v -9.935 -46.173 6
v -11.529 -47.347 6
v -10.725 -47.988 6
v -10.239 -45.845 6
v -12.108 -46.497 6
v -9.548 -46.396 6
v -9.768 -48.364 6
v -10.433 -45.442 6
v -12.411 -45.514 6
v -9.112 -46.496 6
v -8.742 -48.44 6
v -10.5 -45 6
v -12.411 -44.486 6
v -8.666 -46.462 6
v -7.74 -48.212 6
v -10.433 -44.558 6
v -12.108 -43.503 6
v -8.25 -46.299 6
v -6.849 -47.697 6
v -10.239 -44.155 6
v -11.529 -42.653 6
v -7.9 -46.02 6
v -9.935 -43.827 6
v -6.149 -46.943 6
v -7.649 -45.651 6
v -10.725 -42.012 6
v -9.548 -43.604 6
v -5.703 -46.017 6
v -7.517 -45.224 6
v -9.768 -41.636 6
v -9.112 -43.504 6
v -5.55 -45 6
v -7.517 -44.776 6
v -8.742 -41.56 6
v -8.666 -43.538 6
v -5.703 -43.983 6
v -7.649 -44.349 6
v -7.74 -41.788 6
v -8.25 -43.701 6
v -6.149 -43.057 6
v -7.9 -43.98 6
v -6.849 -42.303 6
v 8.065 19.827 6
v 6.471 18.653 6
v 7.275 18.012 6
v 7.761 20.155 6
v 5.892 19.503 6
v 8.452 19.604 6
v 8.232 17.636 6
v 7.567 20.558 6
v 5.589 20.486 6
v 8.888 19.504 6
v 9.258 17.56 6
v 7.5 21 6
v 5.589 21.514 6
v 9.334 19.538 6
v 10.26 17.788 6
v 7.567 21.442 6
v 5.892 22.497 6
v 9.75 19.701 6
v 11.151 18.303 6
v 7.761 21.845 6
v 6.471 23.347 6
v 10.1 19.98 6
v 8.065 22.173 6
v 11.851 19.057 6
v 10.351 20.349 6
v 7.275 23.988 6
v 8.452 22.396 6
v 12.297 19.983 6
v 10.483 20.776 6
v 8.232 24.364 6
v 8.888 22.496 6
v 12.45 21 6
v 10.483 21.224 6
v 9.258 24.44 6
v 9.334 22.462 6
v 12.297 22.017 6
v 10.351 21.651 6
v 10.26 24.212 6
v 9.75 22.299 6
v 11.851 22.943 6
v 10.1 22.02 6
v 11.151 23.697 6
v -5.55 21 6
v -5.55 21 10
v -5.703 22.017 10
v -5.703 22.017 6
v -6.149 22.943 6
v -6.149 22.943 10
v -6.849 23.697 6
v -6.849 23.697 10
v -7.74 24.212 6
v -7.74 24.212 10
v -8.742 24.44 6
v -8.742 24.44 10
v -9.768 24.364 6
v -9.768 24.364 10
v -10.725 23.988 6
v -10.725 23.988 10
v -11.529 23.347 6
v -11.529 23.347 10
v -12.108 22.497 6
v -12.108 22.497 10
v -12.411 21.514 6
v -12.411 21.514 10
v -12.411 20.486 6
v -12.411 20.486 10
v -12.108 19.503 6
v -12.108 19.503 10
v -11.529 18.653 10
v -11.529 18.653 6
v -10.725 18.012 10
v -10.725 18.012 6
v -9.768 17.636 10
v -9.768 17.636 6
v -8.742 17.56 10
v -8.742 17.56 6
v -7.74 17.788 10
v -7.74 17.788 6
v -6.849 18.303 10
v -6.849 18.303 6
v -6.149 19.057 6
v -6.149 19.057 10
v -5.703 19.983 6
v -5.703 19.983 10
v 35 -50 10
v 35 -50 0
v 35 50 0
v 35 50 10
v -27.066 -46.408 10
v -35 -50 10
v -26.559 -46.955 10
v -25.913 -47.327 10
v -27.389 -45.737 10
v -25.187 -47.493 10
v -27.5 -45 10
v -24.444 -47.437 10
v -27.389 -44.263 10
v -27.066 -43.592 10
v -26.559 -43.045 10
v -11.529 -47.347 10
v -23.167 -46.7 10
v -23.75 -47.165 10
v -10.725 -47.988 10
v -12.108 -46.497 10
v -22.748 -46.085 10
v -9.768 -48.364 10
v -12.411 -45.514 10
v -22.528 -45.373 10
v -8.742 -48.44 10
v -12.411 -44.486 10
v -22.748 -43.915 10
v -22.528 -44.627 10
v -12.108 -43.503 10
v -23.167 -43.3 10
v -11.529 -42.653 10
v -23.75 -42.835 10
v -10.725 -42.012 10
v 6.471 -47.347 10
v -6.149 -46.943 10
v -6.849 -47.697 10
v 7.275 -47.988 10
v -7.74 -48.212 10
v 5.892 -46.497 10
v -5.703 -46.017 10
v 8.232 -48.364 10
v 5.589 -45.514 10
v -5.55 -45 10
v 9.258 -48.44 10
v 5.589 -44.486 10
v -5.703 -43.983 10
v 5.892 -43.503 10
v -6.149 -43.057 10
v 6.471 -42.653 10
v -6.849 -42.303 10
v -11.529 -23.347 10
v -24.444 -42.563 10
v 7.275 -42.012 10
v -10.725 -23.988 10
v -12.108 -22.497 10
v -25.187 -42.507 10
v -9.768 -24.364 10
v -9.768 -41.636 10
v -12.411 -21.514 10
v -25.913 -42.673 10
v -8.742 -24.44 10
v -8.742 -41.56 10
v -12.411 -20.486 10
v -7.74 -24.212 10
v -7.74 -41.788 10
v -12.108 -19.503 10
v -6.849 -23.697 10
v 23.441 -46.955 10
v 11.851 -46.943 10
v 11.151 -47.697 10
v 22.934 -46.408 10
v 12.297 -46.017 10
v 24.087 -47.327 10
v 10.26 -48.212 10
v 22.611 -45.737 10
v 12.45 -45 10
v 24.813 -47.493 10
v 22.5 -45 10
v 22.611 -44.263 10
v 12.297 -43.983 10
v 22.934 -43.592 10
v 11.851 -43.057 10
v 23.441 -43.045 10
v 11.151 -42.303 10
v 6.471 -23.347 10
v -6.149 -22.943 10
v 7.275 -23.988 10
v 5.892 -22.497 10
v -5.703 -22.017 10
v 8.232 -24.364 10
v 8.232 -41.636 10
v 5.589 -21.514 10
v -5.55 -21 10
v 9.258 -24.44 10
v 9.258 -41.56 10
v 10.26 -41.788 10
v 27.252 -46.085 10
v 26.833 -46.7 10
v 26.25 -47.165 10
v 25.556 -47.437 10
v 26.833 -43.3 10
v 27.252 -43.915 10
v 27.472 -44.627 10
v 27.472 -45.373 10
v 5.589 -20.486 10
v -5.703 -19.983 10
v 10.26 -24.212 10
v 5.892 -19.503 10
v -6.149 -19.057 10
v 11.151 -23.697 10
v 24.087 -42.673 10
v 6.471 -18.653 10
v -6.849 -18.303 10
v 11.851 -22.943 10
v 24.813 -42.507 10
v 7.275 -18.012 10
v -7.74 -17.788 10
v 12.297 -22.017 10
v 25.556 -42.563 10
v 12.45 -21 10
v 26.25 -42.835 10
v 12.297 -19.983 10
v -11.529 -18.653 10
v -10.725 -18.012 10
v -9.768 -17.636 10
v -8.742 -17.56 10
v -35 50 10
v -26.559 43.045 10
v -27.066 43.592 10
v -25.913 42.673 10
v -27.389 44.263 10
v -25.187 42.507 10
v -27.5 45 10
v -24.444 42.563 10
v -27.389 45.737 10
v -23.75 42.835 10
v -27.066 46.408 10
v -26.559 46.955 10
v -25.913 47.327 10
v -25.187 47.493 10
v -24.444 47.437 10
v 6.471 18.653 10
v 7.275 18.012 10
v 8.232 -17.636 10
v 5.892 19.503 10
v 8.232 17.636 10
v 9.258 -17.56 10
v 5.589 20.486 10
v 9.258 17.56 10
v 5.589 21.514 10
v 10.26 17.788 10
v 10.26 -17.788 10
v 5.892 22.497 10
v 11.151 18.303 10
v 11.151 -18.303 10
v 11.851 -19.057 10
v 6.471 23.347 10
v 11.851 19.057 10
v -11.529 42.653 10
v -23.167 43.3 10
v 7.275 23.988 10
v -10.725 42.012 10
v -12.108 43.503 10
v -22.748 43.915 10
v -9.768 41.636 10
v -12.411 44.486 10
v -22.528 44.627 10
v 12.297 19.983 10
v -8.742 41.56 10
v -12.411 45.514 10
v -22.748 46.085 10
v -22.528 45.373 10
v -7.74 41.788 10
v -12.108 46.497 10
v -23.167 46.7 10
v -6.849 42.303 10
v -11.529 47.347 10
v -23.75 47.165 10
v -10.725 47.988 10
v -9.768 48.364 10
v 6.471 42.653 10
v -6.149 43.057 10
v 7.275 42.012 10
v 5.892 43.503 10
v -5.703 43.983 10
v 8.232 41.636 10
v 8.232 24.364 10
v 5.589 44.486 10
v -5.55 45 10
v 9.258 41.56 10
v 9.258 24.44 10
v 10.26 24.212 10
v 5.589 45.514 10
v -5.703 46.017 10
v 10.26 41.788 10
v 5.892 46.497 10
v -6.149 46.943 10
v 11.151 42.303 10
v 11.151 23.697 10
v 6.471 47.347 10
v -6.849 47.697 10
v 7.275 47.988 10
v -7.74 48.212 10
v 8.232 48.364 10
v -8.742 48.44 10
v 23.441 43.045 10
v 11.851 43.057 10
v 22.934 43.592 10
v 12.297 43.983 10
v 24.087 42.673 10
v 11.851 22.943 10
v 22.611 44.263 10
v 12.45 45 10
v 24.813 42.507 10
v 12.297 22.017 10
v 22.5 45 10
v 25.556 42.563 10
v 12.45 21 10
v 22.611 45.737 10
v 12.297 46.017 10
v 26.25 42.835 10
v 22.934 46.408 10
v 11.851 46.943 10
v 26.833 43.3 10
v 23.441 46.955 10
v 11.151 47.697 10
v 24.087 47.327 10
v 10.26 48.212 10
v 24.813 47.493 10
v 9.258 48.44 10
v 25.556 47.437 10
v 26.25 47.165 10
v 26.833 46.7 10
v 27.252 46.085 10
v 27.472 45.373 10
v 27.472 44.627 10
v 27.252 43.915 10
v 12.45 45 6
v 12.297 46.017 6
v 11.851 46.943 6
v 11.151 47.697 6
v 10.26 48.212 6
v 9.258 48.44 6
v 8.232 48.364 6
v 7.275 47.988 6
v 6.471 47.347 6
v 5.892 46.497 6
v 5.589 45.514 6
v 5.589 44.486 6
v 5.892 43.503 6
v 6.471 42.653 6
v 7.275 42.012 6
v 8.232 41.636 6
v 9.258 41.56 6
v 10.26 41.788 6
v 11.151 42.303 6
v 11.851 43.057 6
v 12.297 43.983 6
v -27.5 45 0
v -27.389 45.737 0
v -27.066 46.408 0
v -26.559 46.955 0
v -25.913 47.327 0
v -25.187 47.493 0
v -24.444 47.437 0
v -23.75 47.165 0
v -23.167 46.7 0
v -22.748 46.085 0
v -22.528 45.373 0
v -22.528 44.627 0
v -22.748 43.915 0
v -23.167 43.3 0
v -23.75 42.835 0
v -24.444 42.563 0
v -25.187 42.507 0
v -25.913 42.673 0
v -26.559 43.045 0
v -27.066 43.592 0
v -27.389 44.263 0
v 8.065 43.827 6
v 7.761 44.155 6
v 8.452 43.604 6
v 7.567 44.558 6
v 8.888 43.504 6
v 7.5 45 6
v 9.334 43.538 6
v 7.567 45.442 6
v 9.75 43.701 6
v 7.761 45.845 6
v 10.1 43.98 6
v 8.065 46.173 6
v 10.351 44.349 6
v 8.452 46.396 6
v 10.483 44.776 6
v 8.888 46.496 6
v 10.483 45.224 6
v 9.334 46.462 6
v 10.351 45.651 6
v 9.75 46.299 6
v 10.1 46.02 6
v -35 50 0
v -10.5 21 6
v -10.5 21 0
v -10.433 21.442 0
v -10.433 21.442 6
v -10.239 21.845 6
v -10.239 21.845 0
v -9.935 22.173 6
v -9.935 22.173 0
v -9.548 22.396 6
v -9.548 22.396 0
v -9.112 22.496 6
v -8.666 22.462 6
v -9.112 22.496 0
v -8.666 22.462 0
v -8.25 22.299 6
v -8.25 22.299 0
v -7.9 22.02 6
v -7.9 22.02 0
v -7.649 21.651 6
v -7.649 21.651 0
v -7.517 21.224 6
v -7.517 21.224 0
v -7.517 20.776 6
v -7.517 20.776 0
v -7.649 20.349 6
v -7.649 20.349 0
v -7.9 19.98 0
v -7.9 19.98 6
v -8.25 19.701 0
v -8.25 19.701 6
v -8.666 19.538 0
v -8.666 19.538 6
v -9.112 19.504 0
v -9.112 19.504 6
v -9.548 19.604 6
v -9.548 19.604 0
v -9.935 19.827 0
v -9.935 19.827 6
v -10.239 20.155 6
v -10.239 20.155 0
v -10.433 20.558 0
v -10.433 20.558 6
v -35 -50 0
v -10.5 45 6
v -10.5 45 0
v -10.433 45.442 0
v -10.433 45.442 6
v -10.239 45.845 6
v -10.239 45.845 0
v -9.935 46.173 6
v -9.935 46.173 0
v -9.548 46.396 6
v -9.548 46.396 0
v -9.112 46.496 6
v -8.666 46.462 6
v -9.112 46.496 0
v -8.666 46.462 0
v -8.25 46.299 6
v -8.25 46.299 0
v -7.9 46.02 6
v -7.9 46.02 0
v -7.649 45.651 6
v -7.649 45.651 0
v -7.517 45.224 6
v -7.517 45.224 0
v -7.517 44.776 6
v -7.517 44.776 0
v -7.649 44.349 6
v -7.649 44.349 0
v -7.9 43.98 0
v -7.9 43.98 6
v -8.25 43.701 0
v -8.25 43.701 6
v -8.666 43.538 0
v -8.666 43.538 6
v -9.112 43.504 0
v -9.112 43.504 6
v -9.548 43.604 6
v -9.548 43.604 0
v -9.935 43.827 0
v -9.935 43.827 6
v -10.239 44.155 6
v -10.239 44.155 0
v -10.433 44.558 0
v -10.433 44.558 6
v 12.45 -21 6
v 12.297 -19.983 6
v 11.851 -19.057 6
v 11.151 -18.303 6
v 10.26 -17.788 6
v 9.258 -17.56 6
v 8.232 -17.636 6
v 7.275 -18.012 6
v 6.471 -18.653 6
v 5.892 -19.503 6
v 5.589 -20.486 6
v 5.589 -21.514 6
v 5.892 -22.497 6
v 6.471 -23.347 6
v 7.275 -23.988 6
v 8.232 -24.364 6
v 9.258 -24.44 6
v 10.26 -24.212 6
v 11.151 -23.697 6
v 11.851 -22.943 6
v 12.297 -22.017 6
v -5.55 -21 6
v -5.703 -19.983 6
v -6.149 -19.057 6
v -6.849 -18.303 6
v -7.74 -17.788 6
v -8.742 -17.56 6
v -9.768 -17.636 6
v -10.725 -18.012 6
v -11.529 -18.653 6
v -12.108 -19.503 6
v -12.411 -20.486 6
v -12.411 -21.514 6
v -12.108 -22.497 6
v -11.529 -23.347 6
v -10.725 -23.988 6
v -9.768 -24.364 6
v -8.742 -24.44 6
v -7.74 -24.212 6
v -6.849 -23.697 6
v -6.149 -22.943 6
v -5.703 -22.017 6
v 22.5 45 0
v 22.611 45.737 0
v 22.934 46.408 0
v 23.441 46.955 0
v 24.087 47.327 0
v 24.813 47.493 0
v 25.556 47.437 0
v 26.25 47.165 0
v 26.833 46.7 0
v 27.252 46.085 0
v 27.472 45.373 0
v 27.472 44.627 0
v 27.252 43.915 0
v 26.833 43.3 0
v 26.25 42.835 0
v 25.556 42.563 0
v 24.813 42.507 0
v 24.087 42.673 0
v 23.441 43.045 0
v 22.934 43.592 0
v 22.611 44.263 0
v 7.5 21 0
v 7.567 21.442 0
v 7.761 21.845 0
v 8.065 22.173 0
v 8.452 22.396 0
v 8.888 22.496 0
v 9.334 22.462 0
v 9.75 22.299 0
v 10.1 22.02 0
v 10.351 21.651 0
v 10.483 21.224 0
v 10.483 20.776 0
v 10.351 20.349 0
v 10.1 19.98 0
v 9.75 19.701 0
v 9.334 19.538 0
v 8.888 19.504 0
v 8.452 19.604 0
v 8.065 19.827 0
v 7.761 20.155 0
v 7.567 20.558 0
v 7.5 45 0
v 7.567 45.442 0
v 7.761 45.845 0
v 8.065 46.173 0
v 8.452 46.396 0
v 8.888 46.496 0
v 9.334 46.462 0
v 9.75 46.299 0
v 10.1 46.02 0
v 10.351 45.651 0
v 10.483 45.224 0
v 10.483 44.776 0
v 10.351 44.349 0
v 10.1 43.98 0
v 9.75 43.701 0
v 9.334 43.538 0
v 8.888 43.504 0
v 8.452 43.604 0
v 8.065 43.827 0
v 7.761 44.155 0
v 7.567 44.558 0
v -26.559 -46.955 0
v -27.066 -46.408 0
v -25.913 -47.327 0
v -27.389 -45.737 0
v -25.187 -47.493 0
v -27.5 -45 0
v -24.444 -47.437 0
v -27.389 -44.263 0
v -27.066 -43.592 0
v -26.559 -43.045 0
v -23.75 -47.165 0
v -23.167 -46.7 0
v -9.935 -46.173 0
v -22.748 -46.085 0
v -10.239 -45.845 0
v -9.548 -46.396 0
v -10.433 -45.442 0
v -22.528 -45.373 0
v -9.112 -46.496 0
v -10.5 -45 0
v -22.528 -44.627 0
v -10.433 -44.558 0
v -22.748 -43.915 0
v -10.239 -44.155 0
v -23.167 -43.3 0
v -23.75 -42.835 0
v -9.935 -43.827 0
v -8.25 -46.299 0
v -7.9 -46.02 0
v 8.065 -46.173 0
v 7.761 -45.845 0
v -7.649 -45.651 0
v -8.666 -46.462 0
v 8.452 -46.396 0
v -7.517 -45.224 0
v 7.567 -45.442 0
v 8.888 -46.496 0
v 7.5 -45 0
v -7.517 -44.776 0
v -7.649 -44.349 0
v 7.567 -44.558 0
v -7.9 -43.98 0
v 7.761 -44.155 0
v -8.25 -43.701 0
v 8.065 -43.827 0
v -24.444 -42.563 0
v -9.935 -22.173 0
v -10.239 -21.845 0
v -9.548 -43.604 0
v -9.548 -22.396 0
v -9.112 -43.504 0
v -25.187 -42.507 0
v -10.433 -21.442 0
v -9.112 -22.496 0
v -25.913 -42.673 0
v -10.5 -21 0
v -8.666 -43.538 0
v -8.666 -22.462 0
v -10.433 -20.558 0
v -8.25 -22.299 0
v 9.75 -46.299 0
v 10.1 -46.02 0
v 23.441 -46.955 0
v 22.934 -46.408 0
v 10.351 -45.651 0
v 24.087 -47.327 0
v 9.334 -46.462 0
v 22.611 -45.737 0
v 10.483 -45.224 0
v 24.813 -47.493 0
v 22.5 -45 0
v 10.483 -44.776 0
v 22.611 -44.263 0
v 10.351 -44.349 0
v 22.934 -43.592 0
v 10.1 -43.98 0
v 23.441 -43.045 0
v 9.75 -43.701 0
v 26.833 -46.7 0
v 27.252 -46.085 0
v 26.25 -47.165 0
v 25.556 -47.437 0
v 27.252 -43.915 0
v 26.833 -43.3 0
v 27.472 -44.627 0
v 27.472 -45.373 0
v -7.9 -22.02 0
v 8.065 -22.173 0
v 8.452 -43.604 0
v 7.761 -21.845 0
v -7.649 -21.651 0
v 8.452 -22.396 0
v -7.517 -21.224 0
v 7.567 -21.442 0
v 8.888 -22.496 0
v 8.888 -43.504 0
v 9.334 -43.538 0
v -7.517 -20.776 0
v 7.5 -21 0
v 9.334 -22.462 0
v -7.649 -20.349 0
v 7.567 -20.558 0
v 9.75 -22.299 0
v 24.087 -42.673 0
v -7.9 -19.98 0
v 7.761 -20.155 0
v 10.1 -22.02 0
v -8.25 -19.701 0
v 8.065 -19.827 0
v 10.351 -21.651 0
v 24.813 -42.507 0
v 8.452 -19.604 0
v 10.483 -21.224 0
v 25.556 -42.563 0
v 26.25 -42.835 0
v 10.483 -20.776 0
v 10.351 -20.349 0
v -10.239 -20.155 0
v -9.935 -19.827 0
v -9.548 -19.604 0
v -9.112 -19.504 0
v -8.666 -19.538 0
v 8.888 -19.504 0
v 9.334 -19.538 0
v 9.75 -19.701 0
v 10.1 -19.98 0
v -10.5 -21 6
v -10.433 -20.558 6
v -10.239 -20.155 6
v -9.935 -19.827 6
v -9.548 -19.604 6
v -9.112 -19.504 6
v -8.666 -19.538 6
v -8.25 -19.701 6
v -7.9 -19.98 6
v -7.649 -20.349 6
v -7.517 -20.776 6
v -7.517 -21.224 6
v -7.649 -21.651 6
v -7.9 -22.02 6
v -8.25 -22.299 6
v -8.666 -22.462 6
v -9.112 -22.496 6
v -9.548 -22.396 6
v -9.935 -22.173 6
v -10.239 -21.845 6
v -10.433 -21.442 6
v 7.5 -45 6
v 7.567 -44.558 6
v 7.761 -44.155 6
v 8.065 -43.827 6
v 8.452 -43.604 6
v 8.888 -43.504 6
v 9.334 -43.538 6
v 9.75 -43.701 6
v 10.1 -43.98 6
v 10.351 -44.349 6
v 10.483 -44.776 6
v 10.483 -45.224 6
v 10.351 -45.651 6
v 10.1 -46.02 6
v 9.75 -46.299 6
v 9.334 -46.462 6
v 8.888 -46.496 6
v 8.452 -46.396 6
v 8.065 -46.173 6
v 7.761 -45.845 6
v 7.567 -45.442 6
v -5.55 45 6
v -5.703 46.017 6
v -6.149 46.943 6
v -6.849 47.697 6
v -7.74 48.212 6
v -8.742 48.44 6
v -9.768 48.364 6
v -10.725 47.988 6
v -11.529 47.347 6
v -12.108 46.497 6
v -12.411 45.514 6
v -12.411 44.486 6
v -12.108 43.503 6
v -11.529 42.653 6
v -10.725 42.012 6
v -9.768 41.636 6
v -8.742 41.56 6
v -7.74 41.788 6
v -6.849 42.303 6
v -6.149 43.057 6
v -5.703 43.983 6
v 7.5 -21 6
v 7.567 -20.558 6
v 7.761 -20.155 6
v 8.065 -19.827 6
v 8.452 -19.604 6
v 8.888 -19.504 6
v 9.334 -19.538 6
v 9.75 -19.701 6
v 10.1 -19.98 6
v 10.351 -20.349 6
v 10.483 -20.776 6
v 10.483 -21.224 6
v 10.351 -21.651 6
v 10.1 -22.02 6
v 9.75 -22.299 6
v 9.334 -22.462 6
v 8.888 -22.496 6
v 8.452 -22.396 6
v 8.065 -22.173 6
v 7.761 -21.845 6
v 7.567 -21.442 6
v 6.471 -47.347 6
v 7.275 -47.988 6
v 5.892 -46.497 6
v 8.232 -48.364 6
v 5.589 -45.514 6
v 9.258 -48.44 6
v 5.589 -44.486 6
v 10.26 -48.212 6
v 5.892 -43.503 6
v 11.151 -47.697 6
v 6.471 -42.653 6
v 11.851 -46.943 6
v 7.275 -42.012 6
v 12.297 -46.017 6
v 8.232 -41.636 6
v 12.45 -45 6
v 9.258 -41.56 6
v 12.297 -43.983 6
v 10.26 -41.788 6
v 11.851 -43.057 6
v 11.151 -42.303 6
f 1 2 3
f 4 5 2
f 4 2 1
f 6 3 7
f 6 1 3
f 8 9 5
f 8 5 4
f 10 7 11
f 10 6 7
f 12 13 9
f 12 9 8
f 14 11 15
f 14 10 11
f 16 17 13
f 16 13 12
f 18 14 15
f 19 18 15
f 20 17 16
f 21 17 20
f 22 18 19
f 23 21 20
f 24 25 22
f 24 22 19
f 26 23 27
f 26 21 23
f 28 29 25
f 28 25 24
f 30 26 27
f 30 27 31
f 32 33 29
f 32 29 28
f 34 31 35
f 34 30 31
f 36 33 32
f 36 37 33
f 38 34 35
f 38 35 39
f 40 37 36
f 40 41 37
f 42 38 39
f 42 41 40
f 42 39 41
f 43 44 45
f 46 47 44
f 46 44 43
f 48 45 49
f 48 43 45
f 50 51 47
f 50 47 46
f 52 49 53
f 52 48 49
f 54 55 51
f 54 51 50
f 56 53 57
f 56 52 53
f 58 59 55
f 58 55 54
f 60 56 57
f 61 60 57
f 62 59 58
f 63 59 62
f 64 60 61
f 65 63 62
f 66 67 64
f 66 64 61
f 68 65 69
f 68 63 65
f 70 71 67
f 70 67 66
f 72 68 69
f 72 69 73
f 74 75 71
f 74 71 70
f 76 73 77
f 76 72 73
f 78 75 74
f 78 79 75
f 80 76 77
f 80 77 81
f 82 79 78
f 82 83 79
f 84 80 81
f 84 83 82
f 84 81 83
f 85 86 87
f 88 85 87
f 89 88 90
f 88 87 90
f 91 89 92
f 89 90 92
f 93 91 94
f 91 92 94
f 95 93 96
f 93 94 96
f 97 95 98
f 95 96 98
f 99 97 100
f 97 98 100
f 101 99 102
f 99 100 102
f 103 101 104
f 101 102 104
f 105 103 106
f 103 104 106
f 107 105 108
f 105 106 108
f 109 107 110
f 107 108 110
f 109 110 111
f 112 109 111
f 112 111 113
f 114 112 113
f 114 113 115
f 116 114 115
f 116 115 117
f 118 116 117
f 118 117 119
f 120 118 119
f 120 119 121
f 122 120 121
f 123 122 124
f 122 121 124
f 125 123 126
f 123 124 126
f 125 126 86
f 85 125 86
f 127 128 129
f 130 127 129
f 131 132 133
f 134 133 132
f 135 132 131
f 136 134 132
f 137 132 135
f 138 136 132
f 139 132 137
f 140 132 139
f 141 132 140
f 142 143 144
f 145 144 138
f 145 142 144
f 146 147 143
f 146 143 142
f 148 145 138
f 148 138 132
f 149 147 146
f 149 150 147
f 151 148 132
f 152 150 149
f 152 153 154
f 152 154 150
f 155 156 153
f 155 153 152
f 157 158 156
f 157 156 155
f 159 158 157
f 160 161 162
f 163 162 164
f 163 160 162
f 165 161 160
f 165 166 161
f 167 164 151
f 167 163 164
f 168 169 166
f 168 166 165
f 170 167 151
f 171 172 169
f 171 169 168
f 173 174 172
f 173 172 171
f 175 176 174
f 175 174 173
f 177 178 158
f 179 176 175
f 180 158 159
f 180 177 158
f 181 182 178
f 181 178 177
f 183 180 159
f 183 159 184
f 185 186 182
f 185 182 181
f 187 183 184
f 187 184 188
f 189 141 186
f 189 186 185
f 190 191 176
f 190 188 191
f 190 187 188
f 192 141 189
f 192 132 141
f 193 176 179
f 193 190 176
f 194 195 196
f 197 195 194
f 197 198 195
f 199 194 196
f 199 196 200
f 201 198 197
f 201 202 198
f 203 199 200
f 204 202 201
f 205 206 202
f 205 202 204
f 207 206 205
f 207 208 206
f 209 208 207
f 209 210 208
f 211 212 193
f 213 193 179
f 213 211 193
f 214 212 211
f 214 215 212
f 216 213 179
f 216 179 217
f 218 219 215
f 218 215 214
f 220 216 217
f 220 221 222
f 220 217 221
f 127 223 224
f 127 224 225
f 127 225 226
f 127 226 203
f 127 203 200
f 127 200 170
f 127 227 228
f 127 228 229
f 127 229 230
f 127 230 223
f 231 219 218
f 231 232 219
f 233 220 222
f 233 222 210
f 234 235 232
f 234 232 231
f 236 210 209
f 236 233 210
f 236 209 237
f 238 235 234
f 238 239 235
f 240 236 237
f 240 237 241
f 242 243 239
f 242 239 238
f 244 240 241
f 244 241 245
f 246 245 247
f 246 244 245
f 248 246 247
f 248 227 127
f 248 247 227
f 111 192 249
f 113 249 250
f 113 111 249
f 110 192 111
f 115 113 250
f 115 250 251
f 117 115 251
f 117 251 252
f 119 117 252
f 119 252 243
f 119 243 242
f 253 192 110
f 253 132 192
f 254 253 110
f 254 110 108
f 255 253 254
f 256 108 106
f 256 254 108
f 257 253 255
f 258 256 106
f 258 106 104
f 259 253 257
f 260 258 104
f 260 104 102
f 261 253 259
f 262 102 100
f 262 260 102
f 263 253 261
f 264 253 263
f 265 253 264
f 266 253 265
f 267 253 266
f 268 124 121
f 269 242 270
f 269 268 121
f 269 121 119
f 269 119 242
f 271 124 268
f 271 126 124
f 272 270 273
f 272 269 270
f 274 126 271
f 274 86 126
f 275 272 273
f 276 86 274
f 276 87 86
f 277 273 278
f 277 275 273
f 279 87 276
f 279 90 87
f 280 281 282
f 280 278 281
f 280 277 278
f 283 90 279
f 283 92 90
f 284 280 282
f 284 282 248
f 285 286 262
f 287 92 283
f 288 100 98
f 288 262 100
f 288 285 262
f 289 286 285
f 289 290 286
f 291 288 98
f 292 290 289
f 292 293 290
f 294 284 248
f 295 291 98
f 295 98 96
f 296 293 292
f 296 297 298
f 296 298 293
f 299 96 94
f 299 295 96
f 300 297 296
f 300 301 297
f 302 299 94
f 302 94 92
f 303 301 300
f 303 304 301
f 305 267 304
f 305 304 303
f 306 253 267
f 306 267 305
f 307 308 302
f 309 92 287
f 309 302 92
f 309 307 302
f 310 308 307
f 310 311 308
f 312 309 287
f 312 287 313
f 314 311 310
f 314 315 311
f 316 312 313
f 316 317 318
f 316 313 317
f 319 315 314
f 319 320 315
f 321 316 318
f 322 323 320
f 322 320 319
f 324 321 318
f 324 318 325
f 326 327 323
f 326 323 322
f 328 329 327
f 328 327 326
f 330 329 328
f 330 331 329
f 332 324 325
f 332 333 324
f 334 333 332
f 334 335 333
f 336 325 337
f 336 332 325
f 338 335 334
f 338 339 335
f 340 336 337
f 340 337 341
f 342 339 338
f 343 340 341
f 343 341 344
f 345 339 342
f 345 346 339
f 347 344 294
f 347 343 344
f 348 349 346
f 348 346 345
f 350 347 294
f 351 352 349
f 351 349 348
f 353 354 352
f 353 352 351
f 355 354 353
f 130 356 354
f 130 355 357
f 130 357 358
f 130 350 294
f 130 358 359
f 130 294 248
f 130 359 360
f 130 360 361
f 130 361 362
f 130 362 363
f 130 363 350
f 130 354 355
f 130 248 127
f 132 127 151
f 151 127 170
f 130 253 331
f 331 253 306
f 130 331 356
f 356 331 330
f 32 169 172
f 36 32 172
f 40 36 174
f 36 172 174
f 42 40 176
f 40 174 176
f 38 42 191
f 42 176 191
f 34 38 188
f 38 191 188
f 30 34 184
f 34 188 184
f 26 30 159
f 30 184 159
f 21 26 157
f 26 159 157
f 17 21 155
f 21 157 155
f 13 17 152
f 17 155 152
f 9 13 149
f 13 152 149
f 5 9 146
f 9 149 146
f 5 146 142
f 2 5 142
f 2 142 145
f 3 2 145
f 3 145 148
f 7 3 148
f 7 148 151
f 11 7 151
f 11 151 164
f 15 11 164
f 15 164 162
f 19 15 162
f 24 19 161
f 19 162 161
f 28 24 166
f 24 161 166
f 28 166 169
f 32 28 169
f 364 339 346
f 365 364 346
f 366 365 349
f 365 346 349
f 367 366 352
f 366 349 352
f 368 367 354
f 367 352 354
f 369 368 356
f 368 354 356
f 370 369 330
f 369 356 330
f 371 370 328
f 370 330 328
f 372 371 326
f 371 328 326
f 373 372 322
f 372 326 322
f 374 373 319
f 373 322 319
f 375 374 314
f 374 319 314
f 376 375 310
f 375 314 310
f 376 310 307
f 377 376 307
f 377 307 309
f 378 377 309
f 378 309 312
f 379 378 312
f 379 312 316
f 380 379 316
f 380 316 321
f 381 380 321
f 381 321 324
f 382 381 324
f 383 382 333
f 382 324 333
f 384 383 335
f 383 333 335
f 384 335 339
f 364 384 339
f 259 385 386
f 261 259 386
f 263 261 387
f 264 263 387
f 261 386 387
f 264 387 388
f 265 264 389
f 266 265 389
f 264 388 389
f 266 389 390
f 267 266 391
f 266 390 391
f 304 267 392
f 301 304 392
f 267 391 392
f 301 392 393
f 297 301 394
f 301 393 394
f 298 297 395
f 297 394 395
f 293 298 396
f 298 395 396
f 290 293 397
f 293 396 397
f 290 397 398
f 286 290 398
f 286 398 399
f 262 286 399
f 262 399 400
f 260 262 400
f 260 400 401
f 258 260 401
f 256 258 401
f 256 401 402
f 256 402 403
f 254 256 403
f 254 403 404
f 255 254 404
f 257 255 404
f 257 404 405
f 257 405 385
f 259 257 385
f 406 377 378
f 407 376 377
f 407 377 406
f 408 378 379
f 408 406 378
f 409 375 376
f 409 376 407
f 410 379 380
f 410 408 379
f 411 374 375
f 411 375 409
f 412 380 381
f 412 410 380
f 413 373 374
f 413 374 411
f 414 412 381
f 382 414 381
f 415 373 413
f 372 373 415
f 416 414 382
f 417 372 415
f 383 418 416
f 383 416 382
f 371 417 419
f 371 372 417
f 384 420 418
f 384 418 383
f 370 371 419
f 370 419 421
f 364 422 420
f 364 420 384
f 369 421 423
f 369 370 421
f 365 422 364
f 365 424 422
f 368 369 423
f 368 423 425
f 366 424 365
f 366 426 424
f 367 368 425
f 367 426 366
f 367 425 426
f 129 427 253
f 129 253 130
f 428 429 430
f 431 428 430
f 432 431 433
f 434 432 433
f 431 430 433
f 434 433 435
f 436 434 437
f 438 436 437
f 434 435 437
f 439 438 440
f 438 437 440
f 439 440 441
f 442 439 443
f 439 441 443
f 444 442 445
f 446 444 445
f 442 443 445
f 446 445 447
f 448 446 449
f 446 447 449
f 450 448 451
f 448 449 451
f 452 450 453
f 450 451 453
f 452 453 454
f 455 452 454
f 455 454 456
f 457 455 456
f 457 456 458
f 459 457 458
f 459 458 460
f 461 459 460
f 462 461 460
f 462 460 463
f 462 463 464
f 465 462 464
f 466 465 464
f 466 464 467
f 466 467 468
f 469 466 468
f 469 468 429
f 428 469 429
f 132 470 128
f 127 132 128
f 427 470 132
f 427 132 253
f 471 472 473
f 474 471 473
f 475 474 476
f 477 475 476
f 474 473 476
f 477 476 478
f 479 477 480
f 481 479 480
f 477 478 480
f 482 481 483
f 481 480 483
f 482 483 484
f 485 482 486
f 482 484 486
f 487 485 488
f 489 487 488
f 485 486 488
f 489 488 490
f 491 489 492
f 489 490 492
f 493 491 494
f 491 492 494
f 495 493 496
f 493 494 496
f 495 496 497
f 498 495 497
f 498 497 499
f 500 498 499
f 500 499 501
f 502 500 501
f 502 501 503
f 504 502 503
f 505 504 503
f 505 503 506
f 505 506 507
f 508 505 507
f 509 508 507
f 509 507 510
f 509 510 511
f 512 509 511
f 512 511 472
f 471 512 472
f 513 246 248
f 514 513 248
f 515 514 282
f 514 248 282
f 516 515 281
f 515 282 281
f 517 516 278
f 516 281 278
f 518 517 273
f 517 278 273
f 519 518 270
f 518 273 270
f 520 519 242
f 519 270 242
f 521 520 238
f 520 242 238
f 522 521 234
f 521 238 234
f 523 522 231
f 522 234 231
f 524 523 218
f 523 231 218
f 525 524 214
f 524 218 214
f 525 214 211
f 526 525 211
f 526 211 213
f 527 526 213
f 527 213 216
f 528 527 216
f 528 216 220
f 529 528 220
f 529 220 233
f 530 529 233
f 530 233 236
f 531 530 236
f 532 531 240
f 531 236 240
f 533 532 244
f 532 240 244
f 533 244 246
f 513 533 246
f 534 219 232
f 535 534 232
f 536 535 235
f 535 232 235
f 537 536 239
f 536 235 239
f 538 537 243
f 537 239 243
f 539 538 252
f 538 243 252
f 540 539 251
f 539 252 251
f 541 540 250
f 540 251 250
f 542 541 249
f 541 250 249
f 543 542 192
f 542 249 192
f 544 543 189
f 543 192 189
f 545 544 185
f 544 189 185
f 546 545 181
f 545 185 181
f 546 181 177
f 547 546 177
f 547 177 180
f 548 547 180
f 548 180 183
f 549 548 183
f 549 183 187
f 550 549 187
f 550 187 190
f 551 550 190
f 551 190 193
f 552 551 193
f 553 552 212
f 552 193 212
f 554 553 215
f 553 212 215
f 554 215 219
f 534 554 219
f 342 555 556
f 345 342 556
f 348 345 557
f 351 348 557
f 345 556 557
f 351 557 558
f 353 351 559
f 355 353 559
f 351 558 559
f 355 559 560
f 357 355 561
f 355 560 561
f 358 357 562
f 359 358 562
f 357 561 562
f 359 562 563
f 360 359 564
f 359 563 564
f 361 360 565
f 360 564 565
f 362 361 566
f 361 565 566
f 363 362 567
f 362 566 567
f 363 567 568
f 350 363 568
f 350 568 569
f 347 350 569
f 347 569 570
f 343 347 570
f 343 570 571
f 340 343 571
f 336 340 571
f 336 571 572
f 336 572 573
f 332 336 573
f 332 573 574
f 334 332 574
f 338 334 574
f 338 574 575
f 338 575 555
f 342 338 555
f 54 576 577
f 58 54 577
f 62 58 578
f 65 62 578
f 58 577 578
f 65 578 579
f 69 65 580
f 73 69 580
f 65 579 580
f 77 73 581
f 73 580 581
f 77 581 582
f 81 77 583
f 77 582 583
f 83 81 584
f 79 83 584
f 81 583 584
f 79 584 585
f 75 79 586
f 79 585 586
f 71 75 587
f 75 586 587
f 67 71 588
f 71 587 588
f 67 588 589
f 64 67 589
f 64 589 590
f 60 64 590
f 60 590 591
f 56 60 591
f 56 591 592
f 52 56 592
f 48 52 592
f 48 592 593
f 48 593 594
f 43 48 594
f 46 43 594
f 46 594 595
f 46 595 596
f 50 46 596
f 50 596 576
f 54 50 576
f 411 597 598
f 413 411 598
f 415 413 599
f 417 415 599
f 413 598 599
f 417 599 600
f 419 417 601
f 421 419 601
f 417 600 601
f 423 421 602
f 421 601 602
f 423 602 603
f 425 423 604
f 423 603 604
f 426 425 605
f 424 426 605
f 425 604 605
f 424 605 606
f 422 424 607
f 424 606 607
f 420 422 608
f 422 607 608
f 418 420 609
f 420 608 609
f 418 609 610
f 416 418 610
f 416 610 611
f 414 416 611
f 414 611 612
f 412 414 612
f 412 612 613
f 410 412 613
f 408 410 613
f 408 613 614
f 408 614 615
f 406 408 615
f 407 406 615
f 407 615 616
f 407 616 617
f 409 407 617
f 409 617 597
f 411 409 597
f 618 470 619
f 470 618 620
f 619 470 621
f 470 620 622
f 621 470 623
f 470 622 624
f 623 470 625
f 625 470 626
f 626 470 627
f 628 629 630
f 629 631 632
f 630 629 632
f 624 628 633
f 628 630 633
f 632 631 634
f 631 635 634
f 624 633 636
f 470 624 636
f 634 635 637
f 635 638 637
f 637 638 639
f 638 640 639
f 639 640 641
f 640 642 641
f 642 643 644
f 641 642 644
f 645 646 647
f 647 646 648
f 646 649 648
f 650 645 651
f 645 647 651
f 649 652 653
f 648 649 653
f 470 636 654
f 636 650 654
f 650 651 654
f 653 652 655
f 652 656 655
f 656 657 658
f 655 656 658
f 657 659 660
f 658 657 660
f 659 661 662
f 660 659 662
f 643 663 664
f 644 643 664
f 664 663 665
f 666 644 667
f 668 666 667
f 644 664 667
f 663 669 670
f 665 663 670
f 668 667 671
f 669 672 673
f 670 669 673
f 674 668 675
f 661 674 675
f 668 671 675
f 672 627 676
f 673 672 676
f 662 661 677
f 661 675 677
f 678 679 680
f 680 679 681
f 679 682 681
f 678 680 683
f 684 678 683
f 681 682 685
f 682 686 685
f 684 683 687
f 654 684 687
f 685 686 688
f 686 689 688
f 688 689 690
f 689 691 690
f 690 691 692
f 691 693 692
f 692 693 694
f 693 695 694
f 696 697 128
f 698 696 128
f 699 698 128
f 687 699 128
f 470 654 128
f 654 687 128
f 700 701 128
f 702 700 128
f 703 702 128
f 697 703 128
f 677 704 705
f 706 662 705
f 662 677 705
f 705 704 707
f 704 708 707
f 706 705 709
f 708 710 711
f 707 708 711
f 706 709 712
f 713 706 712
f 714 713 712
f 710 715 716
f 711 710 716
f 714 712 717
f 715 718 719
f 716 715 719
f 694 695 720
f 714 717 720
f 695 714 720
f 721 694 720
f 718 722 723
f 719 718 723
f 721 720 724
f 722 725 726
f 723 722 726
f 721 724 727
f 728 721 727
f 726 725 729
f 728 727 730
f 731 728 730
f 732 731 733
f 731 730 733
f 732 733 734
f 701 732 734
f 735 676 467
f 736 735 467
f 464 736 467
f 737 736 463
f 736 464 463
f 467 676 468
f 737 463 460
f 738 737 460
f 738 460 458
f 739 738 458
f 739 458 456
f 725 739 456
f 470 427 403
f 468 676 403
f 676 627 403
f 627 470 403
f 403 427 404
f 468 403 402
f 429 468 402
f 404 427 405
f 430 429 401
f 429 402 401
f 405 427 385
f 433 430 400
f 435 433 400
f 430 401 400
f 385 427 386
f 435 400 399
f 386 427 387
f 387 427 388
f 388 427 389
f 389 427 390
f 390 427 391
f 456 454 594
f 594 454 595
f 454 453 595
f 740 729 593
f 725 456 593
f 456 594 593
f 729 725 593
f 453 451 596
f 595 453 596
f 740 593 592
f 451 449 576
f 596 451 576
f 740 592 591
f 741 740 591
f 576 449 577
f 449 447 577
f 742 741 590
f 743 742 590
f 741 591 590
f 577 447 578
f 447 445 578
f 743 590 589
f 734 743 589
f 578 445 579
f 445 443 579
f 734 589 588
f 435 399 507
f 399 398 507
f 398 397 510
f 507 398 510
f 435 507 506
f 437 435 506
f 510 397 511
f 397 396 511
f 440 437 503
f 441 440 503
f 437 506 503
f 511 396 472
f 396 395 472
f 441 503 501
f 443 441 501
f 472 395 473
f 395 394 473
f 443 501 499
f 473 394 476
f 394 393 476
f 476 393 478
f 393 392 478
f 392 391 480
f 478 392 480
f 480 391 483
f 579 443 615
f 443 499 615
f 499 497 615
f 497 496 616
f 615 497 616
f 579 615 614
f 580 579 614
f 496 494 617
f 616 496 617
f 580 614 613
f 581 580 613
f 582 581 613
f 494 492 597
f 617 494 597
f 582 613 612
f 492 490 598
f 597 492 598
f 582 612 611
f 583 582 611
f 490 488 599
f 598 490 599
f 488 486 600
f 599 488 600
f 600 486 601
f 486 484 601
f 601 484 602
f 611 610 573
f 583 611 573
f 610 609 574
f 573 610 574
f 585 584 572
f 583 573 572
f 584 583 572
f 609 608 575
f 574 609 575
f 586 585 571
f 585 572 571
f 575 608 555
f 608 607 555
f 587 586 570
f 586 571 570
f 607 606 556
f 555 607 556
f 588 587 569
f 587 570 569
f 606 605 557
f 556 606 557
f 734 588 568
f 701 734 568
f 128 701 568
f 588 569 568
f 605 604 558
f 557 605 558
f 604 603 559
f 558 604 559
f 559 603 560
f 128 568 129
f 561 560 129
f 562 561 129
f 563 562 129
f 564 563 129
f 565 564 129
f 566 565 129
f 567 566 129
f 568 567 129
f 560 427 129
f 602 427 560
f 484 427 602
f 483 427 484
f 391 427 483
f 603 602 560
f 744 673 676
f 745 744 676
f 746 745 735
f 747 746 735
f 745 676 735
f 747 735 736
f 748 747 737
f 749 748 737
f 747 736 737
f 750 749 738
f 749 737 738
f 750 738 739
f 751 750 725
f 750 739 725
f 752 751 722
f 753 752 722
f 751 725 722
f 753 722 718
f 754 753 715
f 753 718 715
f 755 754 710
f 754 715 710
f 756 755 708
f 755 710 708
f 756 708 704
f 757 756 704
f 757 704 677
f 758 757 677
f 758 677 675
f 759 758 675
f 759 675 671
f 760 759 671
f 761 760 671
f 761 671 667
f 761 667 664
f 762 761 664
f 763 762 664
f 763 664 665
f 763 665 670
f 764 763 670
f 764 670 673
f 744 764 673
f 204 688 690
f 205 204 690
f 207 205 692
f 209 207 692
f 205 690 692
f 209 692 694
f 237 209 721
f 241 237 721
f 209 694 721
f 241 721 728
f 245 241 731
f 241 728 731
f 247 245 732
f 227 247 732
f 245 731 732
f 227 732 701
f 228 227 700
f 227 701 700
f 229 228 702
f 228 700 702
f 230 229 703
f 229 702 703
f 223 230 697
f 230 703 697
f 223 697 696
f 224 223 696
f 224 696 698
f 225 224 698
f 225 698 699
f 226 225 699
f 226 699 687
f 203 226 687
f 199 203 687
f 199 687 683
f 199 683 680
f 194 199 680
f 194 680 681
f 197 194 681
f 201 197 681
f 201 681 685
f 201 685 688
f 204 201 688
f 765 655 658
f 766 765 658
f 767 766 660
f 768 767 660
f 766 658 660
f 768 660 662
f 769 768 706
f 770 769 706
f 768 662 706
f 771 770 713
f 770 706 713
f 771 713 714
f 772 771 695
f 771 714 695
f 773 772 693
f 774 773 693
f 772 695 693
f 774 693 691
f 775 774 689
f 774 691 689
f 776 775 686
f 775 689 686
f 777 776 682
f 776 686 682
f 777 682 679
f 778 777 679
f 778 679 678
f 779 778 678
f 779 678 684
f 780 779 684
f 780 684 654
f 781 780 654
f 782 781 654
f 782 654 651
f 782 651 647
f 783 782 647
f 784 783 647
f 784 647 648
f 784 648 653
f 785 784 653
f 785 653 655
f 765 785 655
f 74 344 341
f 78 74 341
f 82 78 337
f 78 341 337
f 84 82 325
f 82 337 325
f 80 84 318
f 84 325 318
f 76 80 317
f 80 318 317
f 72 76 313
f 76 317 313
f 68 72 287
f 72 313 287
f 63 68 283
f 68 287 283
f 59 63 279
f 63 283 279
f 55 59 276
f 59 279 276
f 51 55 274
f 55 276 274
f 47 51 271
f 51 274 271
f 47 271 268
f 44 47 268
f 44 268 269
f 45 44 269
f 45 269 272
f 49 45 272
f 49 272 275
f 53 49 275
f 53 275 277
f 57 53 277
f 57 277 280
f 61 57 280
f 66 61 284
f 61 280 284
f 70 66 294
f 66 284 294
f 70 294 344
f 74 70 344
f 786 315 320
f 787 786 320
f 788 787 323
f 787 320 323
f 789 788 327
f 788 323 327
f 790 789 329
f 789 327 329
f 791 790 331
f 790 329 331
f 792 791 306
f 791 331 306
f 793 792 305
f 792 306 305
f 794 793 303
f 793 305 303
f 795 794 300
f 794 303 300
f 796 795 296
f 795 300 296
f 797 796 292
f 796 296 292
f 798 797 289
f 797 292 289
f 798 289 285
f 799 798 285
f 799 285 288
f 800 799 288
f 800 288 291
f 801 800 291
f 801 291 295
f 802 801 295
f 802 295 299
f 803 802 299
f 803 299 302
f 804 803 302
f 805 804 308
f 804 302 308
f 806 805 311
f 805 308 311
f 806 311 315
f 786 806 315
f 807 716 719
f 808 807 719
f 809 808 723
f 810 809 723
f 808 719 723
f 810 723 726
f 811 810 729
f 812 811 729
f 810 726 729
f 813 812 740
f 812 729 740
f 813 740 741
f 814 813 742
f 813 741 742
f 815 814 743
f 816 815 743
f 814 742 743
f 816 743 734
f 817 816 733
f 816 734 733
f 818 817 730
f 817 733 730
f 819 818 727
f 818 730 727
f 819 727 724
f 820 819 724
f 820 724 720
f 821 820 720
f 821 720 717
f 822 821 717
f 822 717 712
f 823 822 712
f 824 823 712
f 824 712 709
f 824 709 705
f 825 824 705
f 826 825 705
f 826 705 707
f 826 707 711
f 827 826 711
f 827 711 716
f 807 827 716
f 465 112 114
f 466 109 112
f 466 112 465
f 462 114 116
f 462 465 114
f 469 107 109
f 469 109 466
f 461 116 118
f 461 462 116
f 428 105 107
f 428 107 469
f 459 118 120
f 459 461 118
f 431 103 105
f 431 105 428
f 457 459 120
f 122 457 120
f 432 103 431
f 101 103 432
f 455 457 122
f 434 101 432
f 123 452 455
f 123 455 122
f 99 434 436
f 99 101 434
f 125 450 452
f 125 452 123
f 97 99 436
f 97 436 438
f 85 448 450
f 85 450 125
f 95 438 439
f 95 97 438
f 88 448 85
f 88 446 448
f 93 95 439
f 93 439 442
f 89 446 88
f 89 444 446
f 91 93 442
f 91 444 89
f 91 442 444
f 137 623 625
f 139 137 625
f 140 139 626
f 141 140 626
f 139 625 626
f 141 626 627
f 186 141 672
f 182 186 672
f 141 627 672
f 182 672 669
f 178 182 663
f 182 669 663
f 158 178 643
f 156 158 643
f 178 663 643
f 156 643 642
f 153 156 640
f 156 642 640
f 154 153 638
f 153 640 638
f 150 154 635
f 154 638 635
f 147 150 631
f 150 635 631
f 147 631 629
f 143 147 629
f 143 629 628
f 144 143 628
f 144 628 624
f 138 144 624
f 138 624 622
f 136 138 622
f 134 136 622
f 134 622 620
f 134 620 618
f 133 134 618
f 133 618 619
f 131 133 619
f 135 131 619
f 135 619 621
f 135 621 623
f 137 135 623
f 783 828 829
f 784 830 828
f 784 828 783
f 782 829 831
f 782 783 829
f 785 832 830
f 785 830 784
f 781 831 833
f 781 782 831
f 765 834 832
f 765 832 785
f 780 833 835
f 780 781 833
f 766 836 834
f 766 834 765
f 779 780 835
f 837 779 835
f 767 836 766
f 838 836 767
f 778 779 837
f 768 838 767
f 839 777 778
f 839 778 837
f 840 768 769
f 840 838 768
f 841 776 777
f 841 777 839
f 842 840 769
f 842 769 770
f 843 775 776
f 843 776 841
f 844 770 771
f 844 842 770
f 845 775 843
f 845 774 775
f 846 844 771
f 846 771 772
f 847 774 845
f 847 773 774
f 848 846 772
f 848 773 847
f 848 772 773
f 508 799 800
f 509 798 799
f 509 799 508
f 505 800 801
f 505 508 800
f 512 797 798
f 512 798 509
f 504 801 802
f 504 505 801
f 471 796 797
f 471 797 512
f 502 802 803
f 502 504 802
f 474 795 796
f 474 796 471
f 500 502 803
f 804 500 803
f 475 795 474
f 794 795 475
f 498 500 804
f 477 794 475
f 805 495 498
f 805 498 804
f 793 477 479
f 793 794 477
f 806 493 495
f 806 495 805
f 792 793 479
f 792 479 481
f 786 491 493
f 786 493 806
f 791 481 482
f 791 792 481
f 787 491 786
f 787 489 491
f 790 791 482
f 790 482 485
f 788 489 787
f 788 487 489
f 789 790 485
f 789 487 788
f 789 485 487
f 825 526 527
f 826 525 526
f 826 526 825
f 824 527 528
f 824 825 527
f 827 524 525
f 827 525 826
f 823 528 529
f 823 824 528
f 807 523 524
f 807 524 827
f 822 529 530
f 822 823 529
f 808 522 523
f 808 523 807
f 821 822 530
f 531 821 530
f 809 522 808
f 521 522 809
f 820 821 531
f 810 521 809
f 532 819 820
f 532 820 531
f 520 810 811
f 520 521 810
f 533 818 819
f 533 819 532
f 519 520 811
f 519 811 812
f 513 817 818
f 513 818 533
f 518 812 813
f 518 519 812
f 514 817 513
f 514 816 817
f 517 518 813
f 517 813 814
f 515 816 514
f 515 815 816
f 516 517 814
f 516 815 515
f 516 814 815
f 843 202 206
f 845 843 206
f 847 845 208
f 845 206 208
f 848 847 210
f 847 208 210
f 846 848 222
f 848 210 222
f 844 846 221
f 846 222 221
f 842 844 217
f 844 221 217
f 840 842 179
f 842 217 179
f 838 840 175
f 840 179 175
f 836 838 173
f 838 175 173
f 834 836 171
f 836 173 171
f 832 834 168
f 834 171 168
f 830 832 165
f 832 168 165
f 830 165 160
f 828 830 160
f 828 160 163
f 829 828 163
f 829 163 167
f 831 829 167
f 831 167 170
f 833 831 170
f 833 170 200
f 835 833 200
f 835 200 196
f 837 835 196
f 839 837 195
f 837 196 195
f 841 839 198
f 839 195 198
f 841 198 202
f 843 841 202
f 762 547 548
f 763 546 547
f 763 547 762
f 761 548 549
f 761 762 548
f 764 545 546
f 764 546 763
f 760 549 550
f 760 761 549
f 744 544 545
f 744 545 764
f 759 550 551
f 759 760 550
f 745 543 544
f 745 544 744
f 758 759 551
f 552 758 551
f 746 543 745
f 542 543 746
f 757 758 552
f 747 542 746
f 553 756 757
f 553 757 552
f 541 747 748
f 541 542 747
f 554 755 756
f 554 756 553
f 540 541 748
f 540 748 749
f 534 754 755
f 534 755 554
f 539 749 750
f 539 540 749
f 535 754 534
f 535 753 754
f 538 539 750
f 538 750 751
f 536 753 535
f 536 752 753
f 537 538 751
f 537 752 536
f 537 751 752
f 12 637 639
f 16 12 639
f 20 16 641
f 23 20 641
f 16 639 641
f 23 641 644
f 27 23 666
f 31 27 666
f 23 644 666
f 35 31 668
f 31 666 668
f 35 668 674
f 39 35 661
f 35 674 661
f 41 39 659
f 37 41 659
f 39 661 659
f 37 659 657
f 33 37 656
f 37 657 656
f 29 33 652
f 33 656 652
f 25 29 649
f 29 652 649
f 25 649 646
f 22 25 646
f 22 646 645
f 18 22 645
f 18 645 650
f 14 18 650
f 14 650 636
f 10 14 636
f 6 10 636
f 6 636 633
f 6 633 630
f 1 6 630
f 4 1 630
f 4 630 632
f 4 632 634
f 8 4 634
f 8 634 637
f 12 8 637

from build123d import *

# Parameters (mm, degrees)
SKETCH1_W           = 70
SKETCH1_H           = 100
BOSS_EXTRUDE1_DEPTH = 10
SKETCH2_R           = 2.5
CUT_EXTRUDE1_DEPTH  = 11
SKETCH3_R           = 1.5
CUT_EXTRUDE2_DEPTH  = 11
SKETCH4_R           = 3.45
CUT_EXTRUDE3_DEPTH  = 4


with BuildPart() as part:
    # Sketch1 → Boss-Extrude1 (new body)
    with BuildSketch(Plane.XY):
        Rectangle(SKETCH1_W, SKETCH1_H)
    extrude(amount=BOSS_EXTRUDE1_DEPTH)

    # Sketch2 → Cut-Extrude1 (cut, through all)
    with BuildSketch(Plane(origin=(0, 0, 0), x_dir=(-1, 0, 0), z_dir=(0, 0, -1))):
        with Locations((-25, 45)):
            Circle(SKETCH2_R)
        with Locations((25, 45)):
            Circle(SKETCH2_R)
        with Locations((-25, -45)):
            Circle(SKETCH2_R)
        with Locations((25, -45)):
            Circle(SKETCH2_R)
    extrude(amount=-CUT_EXTRUDE1_DEPTH, mode=Mode.SUBTRACT)

    # Sketch3 → Cut-Extrude2 (cut, through all)
    with BuildSketch(Plane(origin=(0, 0, 0), x_dir=(-1, 0, 0), z_dir=(0, 0, -1))):
        with Locations((9, 21)):
            Circle(SKETCH3_R)
        with Locations((9, 45)):
            Circle(SKETCH3_R)
        with Locations((-9, 21)):
            Circle(SKETCH3_R)
        with Locations((-9, 45)):
            Circle(SKETCH3_R)
        with Locations((9, -45)):
            Circle(SKETCH3_R)
        with Locations((9, -21)):
            Circle(SKETCH3_R)
        with Locations((-9, -45)):
            Circle(SKETCH3_R)
        with Locations((-9, -21)):
            Circle(SKETCH3_R)
    extrude(amount=-CUT_EXTRUDE2_DEPTH, mode=Mode.SUBTRACT)

    # Sketch4 → Cut-Extrude3 (cut)
    with BuildSketch(Plane.XY.offset(10)):
        with Locations((-9, 45)):
            Circle(SKETCH4_R)
        with Locations((-9, 21)):
            Circle(SKETCH4_R)
        with Locations((9, 21)):
            Circle(SKETCH4_R)
        with Locations((9, 45)):
            Circle(SKETCH4_R)
        with Locations((9, -21)):
            Circle(SKETCH4_R)
        with Locations((-9, -21)):
            Circle(SKETCH4_R)
        with Locations((-9, -45)):
            Circle(SKETCH4_R)
        with Locations((9, -45)):
            Circle(SKETCH4_R)
    extrude(amount=-CUT_EXTRUDE3_DEPTH, mode=Mode.SUBTRACT)


solid = part.part
